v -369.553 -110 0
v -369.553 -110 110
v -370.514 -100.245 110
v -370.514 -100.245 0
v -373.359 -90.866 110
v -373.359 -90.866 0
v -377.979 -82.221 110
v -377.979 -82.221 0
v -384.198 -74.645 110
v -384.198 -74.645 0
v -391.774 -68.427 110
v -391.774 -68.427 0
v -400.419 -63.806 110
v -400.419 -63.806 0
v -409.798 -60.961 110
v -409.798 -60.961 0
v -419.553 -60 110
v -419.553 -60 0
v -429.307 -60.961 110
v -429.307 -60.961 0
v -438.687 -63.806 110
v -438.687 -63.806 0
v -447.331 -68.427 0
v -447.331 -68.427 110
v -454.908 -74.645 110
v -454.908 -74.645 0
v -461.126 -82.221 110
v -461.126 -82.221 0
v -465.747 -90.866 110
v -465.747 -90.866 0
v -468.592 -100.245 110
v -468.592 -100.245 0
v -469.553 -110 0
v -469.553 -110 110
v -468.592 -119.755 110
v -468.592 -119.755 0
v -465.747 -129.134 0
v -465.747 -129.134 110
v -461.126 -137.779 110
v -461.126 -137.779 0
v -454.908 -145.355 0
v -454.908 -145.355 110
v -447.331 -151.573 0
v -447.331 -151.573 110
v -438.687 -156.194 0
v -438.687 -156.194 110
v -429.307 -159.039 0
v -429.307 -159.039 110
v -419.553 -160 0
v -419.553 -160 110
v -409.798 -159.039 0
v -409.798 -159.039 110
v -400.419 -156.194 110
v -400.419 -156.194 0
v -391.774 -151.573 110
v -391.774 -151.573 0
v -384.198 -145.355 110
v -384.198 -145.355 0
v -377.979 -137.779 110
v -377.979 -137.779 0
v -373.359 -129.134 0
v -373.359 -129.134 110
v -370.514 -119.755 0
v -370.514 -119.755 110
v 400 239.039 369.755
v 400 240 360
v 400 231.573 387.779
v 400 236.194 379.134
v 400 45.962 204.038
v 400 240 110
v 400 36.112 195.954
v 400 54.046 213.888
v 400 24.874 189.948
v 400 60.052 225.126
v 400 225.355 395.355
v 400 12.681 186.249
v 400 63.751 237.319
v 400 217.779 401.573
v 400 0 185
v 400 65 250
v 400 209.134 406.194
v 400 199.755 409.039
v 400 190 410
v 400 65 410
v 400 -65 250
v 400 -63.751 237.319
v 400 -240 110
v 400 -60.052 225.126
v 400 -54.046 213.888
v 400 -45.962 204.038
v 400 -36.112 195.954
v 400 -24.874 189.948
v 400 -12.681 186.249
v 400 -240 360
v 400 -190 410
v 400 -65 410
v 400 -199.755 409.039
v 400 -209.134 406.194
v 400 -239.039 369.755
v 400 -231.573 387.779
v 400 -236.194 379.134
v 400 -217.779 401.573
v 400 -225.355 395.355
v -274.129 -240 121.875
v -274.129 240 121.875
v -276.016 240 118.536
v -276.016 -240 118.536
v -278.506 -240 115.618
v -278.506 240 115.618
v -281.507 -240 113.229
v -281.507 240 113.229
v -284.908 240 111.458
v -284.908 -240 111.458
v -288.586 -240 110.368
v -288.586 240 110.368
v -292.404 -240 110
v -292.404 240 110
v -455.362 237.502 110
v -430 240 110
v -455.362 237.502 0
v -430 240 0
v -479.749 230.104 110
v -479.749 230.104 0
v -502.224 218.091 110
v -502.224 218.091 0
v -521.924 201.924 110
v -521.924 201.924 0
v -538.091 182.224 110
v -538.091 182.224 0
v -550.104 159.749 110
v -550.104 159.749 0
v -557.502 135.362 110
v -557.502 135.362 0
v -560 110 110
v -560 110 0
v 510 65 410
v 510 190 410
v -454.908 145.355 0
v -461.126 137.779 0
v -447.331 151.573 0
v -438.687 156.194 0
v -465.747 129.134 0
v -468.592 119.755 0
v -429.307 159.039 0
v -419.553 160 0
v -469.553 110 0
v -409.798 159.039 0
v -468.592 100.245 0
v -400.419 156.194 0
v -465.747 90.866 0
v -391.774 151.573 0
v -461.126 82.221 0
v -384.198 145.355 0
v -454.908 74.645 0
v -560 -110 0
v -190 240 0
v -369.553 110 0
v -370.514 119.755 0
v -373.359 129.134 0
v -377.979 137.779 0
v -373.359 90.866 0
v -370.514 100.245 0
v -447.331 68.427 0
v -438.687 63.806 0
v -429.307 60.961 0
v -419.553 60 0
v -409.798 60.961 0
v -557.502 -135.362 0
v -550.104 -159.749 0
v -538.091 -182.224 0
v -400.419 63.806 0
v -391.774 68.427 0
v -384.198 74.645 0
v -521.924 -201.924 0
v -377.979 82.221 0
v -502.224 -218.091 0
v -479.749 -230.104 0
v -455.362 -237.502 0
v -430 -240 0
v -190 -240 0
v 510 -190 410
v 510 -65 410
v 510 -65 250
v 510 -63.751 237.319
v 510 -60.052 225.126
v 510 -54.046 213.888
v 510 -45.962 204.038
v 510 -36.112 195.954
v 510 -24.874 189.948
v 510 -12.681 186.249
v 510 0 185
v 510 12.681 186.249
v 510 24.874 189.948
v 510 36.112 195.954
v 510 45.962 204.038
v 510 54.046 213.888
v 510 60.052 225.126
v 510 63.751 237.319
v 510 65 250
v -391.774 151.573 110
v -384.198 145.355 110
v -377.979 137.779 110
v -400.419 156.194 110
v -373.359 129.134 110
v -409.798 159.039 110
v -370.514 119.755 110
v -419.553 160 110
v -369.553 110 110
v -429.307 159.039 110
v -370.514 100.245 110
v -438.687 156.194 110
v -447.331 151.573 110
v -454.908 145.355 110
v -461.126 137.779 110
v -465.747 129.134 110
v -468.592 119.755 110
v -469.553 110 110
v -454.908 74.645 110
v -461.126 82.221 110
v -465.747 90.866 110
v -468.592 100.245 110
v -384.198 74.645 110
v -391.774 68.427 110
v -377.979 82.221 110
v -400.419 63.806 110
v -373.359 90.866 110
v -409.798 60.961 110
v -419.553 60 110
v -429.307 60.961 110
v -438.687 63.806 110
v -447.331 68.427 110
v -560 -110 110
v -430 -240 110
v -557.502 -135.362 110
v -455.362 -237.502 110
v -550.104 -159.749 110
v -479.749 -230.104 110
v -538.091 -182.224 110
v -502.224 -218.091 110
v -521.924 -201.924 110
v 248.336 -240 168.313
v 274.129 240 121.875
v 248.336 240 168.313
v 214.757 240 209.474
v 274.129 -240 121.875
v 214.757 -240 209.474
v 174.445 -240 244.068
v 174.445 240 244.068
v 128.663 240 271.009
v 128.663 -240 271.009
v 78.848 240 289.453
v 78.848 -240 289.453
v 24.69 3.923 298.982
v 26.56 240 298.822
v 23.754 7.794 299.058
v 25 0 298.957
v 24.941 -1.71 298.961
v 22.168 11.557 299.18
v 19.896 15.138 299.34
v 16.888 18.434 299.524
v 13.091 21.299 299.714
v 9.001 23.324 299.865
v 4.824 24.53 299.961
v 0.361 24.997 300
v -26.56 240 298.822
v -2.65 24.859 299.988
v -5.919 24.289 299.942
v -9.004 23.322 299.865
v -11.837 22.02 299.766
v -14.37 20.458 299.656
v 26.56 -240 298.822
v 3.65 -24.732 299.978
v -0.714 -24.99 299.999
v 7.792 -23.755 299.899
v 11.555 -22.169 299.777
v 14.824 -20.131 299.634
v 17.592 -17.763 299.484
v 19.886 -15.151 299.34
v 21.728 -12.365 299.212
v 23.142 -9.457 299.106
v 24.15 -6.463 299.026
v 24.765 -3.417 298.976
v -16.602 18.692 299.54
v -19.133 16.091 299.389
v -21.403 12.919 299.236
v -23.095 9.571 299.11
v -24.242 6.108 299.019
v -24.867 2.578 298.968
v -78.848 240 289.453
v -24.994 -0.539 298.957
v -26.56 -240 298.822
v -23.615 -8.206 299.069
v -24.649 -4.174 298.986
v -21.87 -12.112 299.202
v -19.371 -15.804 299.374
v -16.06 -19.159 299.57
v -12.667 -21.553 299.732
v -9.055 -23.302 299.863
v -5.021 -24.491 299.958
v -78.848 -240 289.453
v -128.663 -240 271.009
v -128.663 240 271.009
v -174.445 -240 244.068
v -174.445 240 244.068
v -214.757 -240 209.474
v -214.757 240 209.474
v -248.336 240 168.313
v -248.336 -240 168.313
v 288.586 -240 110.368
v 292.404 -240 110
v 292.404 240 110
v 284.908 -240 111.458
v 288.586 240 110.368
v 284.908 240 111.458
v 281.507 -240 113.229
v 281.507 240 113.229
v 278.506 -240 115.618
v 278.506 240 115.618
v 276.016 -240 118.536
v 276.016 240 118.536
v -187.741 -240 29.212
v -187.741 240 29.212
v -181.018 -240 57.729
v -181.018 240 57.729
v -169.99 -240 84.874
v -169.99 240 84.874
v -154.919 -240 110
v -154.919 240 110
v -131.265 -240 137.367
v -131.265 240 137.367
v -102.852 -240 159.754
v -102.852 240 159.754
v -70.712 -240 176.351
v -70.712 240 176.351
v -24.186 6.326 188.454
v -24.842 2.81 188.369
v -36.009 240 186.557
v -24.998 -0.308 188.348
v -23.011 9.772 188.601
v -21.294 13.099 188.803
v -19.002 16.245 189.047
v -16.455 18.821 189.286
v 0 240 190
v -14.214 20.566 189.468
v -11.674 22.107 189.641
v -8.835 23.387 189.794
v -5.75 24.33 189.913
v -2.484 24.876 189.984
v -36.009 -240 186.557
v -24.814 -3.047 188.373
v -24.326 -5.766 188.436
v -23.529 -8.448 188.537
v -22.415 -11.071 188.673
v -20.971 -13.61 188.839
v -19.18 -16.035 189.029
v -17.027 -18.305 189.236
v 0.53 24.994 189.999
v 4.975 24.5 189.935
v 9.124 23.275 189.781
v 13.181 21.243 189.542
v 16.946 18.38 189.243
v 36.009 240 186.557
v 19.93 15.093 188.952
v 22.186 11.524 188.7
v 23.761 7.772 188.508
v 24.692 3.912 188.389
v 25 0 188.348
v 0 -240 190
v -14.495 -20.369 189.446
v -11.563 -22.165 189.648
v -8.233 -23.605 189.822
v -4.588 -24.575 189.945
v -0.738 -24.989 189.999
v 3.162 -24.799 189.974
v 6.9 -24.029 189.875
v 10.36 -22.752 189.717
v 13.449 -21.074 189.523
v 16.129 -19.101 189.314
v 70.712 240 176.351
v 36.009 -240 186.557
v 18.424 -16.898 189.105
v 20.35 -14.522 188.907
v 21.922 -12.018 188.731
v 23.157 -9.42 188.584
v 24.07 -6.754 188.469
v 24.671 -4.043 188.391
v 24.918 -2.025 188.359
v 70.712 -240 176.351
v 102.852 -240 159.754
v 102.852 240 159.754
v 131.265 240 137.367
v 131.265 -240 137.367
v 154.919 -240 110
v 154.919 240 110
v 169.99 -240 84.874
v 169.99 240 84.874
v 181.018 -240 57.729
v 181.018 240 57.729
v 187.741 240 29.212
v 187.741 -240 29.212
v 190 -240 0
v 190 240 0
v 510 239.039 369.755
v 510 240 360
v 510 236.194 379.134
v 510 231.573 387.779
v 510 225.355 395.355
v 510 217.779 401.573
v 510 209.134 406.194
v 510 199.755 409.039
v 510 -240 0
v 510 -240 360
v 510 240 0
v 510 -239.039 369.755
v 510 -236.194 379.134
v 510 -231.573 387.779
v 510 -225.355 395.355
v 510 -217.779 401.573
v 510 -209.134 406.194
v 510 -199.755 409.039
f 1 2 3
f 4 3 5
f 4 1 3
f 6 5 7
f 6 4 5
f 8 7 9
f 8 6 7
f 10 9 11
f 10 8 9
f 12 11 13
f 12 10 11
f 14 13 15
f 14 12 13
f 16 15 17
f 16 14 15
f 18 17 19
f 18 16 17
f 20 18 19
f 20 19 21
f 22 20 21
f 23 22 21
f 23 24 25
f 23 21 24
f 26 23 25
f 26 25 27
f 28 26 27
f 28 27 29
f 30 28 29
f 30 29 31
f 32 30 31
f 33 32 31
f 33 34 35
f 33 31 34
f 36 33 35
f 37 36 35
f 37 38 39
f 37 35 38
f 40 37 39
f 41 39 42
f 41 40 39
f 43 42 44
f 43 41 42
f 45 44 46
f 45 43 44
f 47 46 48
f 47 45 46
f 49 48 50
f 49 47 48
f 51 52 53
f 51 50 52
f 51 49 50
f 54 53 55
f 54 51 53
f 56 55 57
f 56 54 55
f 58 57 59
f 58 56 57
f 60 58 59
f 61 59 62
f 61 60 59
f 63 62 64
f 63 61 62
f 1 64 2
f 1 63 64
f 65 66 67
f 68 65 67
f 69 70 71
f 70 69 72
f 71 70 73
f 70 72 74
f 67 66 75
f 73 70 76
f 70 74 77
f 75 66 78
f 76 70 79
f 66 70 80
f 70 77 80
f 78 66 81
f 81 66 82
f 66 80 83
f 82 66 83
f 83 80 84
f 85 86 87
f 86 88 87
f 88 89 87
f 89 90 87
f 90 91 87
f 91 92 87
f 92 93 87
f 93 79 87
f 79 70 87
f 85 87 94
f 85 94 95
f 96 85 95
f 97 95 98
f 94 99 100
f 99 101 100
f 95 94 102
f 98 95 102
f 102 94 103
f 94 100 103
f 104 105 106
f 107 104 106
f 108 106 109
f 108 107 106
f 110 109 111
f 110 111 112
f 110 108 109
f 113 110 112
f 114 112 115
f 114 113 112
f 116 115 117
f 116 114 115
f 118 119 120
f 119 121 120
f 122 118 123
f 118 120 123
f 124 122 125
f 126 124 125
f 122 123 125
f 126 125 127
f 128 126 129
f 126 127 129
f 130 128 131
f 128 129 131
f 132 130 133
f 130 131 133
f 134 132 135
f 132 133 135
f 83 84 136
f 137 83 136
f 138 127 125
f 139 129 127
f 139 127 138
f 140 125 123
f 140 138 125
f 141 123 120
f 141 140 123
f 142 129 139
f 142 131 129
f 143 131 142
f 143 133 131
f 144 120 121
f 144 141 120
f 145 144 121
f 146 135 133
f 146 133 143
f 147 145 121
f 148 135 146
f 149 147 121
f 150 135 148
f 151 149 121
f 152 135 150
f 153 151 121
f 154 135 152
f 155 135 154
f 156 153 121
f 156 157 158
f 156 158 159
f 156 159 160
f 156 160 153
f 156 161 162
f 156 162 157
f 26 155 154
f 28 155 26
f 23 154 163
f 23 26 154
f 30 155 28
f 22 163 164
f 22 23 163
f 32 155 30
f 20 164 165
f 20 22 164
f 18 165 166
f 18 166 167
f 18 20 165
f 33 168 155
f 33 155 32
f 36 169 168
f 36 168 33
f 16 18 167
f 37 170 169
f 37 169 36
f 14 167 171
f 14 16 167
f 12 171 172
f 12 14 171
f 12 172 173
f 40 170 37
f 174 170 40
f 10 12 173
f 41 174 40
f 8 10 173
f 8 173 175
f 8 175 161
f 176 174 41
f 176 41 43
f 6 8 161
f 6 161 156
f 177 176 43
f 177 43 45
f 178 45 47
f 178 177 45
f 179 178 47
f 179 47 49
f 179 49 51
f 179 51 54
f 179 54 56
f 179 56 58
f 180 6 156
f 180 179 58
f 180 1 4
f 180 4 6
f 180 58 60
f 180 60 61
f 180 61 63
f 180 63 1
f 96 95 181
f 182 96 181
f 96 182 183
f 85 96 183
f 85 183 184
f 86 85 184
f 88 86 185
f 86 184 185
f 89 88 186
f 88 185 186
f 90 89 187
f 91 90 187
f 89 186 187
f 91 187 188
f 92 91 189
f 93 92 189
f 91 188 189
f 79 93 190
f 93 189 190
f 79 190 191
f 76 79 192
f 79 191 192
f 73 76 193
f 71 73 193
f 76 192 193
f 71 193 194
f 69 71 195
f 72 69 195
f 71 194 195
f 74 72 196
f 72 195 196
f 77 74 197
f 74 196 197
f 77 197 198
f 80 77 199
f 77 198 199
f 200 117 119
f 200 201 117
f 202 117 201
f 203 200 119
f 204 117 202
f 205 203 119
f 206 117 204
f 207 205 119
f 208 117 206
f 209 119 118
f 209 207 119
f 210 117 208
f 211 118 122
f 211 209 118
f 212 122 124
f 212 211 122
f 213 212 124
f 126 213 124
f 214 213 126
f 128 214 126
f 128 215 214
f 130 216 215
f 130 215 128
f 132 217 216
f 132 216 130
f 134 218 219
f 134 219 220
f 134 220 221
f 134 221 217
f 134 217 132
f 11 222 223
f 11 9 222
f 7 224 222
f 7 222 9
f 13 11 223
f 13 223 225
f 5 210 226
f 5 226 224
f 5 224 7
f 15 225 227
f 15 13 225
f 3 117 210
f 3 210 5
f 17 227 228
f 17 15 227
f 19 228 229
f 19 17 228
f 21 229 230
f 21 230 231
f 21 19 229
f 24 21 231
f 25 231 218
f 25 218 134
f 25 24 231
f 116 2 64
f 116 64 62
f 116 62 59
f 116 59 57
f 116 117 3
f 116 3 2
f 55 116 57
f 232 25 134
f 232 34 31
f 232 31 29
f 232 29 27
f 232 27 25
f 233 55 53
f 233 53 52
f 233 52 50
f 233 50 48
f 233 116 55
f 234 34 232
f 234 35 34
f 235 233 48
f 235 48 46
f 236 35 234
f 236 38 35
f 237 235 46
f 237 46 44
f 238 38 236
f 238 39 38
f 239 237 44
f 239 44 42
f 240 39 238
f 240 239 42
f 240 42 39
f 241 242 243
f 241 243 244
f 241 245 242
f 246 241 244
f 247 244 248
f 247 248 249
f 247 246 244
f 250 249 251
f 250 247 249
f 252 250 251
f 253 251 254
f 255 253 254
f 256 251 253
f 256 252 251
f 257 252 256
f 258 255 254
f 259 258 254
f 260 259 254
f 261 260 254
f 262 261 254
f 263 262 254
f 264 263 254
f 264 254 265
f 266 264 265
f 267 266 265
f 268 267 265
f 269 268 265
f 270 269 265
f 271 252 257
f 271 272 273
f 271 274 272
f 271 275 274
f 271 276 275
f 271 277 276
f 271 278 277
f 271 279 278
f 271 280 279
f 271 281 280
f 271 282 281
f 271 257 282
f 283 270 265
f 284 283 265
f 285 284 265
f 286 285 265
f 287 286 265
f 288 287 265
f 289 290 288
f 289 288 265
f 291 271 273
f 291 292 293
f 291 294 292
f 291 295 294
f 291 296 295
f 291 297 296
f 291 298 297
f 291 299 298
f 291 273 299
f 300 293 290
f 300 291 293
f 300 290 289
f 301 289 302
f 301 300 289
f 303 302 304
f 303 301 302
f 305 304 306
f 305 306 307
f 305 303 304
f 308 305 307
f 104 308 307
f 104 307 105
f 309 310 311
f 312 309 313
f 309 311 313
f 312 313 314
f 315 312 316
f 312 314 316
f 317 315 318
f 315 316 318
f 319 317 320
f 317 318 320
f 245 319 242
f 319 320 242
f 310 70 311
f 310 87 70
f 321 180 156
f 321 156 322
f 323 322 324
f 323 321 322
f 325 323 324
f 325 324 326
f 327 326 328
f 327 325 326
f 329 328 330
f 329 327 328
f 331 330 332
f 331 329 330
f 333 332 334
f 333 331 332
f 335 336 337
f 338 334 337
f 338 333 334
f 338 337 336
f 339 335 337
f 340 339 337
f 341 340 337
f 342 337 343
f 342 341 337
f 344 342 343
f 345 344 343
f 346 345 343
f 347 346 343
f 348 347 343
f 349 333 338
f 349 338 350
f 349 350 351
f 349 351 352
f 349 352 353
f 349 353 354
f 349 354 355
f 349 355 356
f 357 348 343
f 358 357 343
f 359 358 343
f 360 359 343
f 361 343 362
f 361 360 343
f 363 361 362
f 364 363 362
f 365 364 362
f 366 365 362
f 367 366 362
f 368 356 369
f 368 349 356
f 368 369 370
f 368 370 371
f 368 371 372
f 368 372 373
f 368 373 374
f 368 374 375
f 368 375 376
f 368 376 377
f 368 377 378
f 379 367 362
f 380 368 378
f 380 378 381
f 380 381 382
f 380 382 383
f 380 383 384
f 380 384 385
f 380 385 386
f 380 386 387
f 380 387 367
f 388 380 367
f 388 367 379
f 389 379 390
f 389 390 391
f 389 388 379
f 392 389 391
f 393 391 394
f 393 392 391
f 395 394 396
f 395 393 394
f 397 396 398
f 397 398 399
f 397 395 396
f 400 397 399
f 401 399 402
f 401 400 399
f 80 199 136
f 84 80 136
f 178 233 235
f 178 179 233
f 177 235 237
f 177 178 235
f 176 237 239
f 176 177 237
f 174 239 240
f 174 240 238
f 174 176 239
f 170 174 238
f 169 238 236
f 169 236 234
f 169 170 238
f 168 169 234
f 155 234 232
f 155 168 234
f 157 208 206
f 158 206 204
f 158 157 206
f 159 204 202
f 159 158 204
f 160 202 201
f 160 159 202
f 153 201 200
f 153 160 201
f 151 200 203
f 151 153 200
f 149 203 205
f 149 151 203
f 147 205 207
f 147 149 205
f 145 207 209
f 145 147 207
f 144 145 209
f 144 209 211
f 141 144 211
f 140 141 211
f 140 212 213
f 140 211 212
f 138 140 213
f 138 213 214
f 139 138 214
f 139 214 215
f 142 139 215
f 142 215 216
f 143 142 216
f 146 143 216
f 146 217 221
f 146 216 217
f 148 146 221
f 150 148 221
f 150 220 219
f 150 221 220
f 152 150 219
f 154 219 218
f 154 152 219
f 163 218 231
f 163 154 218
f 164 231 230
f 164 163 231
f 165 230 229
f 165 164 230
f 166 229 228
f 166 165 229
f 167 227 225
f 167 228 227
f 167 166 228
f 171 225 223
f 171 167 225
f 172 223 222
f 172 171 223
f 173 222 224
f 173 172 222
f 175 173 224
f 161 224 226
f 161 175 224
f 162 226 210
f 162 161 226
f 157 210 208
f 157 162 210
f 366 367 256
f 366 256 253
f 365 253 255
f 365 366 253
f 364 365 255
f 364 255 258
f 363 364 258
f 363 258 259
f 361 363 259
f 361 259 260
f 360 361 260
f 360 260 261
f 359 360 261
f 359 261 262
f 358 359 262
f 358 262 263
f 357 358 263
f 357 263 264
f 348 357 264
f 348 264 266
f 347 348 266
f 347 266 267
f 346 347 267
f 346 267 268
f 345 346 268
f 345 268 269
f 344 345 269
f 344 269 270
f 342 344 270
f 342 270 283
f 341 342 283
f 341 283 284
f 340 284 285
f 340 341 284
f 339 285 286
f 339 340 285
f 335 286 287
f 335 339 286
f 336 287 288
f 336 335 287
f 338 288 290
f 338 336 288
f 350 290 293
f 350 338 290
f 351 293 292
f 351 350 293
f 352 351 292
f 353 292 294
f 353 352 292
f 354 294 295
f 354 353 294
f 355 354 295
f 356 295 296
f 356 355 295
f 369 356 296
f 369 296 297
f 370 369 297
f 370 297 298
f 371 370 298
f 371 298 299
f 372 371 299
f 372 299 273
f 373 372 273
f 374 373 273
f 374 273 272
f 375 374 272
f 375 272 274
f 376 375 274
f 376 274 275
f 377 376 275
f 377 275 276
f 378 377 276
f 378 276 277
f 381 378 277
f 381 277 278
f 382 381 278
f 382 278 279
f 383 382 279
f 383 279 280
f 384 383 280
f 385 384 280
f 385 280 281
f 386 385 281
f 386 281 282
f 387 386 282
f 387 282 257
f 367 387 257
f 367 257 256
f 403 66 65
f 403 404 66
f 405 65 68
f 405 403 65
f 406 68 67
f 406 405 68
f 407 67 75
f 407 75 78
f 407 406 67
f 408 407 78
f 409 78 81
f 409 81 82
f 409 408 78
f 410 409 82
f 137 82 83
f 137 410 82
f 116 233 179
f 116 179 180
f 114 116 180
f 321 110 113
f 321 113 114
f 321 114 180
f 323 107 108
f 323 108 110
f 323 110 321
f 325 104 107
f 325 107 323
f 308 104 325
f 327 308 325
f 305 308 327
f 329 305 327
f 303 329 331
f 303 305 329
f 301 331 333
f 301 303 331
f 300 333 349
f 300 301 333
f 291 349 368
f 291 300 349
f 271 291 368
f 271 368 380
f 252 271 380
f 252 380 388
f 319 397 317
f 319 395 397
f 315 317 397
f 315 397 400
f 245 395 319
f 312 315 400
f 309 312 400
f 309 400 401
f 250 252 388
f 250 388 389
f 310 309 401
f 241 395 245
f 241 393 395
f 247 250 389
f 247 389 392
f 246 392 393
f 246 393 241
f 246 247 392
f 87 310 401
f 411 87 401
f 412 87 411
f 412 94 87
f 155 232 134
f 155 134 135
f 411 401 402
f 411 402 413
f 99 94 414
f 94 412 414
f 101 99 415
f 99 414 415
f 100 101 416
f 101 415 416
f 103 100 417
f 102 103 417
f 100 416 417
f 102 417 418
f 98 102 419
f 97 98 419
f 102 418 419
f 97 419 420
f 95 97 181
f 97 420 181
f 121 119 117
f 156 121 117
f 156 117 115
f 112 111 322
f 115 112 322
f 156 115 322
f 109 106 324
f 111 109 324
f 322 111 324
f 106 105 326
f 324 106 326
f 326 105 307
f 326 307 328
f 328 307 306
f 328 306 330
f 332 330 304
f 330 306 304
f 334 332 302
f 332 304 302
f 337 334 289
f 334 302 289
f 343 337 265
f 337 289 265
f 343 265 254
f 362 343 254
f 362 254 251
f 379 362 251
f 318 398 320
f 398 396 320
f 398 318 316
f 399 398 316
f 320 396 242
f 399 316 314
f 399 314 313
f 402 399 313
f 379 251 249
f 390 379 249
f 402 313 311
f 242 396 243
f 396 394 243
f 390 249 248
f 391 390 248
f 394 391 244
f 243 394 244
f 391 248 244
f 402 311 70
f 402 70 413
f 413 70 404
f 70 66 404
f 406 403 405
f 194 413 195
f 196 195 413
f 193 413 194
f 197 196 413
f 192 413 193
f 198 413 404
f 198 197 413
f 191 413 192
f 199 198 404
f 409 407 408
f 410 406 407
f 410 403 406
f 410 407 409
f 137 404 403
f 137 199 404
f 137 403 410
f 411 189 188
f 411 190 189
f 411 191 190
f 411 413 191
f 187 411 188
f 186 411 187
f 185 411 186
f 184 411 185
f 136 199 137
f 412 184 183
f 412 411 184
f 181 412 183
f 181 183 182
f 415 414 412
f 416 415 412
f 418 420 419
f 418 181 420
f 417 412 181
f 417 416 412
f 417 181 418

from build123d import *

# Parameters (mm, degrees)
F0_W     = 110
F0_H     = 300
F1_DEPTH = 240
F3_DEPTH = 110
F4_R     = 50
F4_R_2   = 25
F5_DEPTH = 410.001
F6_R     = 130
F7_R     = 50
F8_R     = 20


with BuildPart() as f1:
    # F0 (on Front) → F1 (new body, symmetric)
    with BuildSketch(Plane.XZ):
        with BuildLine():
            Line((154.9193338483, 110), (279.1057147391, 110))
            ThreePointArc((279.1057147391, 110), (0, 300), (-279.1057147391, 110))
            Line((-279.1057147391, 110), (-154.9193338483, 110))
            ThreePointArc((-154.9193338483, 110), (0, 190), (154.9193338483, 110))
        make_face()
        with BuildLine():
            Line((190, 0), (300, 0))
            ThreePointArc((300, 0), (294.7301430306, 55.9834153044), (279.1057147391, 110))
            Line((279.1057147391, 110), (154.9193338483, 110))
            ThreePointArc((154.9193338483, 110), (181.0175038928, 57.7292238334), (190, 0))
        make_face()
        with BuildLine():
            Line((-560, 0), (-300, 0))
            ThreePointArc((-300, 0), (-294.7301430306, 55.9834153044), (-279.1057147391, 110))
            Line((-279.1057147391, 110), (-560, 110))
            Line((-560, 110), (-560, 0))
        make_face()
        with BuildLine():
            ThreePointArc((-279.1057147391, 110), (-294.7301430306, 55.9834153044), (-300, 0))
            Line((-300, 0), (-190, 0))
            ThreePointArc((-190, 0), (-181.0175038928, 57.7292238334), (-154.9193338483, 110))
            Line((-154.9193338483, 110), (-279.1057147391, 110))
        make_face()
        with BuildLine():
            ThreePointArc((279.1057147391, 110), (294.7301430306, 55.9834153044), (300, 0))
            Line((300, 0), (510, 0))
            Line((510, 0), (510, 110))
            Line((510, 110), (400, 110))
            Line((400, 110), (279.1057147391, 110))
        make_face()
        with Locations((455, 260)):
            Rectangle(F0_W, F0_H)
    extrude(amount=F1_DEPTH, both=True)

    # F2 (on face) → F3 (cut, through all)
    with BuildSketch(Plane.YZ.offset(510)):
        with BuildLine():
            ThreePointArc((-65, 250), (0, 185), (65, 250))
            ThreePointArc((65, 250), (0, 315), (-65, 250))
        make_face()
        with BuildLine():
            ThreePointArc((-65, 250), (0, 315), (65, 250))
            Line((65, 250), (65, 410))
            Line((65, 410), (-65, 410))
            Line((-65, 410), (-65, 250))
        make_face()
    extrude(amount=-F3_DEPTH, mode=Mode.SUBTRACT)

    # F4 (on Top) → F5 (cut, through all)
    with BuildSketch(Plane.XY):
        with Locations((-419.5528573695, 110)):
            Circle(F4_R)
        with Locations((-419.5528573695, -110)):
            Circle(F4_R)
        Circle(F4_R_2)
    extrude(amount=F5_DEPTH, mode=Mode.SUBTRACT)

    # F6
    f6_edges = [f1.edges().sort_by_distance(p)[0] for p in [
        (-560, 240, 55),
        (-560, -240, 55),
    ]]
    fillet(f6_edges, radius=F6_R)

    # F7
    f7_edges = [f1.edges().sort_by_distance(p)[0] for p in [
        (455, 240, 410),
        (455, -240, 410),
    ]]
    fillet(f7_edges, radius=F7_R)

    # F8
    f8_edges = [f1.edges().sort_by_distance(p)[0] for p in [
        (-279.105715, 0, 110),
        (279.105715, 0, 110),
    ]]
    fillet(f8_edges, radius=F8_R)


solid = f1.part
